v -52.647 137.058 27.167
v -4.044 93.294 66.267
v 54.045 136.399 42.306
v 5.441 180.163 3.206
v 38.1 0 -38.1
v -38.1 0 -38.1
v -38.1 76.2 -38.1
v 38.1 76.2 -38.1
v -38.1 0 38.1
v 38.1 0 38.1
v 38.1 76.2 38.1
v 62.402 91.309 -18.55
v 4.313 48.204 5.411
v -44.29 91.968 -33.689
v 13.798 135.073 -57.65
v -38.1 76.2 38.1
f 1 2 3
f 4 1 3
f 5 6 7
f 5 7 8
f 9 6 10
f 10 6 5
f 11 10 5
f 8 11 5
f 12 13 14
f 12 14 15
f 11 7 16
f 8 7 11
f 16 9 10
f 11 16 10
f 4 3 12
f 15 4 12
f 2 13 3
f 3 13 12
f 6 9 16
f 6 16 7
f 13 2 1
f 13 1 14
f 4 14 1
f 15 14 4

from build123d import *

# Parameters (mm, degrees)
SKETCH1_W             = 76.2
SKETCH1_H             = 76.2
BOSS_EXTRUDE1_DEPTH   = 76.2
BODY_MOVE_COPY1_ANGLE = 55.414104867


with BuildPart() as part:
    # Sketch1 → Boss-Extrude1 (new body)
    with BuildSketch(Plane(origin=(0, 0, 0), x_dir=(1, 0, 0), z_dir=(0, 1, 0))):
        Rectangle(SKETCH1_W, SKETCH1_H)
    extrude(amount=BOSS_EXTRUDE1_DEPTH)


with BuildPart() as body_2:
    # Body-Move/Copy1: copy of part
    add(part.part.moved(Location((0, 0, 0))).rotate(Axis((5.437361952, 44.153662141, -2.520942783), (-0.6710198380109645, 0.12436617590709464, 0.7309346285995654)), BODY_MOVE_COPY1_ANGLE))


with BuildPart() as body_2_1:
    # Body-Move/Copy2: moved
    add(body_2.part.moved(Location((0, 75.090636707, 0))))


solid = Compound([part.part, body_2_1.part])
